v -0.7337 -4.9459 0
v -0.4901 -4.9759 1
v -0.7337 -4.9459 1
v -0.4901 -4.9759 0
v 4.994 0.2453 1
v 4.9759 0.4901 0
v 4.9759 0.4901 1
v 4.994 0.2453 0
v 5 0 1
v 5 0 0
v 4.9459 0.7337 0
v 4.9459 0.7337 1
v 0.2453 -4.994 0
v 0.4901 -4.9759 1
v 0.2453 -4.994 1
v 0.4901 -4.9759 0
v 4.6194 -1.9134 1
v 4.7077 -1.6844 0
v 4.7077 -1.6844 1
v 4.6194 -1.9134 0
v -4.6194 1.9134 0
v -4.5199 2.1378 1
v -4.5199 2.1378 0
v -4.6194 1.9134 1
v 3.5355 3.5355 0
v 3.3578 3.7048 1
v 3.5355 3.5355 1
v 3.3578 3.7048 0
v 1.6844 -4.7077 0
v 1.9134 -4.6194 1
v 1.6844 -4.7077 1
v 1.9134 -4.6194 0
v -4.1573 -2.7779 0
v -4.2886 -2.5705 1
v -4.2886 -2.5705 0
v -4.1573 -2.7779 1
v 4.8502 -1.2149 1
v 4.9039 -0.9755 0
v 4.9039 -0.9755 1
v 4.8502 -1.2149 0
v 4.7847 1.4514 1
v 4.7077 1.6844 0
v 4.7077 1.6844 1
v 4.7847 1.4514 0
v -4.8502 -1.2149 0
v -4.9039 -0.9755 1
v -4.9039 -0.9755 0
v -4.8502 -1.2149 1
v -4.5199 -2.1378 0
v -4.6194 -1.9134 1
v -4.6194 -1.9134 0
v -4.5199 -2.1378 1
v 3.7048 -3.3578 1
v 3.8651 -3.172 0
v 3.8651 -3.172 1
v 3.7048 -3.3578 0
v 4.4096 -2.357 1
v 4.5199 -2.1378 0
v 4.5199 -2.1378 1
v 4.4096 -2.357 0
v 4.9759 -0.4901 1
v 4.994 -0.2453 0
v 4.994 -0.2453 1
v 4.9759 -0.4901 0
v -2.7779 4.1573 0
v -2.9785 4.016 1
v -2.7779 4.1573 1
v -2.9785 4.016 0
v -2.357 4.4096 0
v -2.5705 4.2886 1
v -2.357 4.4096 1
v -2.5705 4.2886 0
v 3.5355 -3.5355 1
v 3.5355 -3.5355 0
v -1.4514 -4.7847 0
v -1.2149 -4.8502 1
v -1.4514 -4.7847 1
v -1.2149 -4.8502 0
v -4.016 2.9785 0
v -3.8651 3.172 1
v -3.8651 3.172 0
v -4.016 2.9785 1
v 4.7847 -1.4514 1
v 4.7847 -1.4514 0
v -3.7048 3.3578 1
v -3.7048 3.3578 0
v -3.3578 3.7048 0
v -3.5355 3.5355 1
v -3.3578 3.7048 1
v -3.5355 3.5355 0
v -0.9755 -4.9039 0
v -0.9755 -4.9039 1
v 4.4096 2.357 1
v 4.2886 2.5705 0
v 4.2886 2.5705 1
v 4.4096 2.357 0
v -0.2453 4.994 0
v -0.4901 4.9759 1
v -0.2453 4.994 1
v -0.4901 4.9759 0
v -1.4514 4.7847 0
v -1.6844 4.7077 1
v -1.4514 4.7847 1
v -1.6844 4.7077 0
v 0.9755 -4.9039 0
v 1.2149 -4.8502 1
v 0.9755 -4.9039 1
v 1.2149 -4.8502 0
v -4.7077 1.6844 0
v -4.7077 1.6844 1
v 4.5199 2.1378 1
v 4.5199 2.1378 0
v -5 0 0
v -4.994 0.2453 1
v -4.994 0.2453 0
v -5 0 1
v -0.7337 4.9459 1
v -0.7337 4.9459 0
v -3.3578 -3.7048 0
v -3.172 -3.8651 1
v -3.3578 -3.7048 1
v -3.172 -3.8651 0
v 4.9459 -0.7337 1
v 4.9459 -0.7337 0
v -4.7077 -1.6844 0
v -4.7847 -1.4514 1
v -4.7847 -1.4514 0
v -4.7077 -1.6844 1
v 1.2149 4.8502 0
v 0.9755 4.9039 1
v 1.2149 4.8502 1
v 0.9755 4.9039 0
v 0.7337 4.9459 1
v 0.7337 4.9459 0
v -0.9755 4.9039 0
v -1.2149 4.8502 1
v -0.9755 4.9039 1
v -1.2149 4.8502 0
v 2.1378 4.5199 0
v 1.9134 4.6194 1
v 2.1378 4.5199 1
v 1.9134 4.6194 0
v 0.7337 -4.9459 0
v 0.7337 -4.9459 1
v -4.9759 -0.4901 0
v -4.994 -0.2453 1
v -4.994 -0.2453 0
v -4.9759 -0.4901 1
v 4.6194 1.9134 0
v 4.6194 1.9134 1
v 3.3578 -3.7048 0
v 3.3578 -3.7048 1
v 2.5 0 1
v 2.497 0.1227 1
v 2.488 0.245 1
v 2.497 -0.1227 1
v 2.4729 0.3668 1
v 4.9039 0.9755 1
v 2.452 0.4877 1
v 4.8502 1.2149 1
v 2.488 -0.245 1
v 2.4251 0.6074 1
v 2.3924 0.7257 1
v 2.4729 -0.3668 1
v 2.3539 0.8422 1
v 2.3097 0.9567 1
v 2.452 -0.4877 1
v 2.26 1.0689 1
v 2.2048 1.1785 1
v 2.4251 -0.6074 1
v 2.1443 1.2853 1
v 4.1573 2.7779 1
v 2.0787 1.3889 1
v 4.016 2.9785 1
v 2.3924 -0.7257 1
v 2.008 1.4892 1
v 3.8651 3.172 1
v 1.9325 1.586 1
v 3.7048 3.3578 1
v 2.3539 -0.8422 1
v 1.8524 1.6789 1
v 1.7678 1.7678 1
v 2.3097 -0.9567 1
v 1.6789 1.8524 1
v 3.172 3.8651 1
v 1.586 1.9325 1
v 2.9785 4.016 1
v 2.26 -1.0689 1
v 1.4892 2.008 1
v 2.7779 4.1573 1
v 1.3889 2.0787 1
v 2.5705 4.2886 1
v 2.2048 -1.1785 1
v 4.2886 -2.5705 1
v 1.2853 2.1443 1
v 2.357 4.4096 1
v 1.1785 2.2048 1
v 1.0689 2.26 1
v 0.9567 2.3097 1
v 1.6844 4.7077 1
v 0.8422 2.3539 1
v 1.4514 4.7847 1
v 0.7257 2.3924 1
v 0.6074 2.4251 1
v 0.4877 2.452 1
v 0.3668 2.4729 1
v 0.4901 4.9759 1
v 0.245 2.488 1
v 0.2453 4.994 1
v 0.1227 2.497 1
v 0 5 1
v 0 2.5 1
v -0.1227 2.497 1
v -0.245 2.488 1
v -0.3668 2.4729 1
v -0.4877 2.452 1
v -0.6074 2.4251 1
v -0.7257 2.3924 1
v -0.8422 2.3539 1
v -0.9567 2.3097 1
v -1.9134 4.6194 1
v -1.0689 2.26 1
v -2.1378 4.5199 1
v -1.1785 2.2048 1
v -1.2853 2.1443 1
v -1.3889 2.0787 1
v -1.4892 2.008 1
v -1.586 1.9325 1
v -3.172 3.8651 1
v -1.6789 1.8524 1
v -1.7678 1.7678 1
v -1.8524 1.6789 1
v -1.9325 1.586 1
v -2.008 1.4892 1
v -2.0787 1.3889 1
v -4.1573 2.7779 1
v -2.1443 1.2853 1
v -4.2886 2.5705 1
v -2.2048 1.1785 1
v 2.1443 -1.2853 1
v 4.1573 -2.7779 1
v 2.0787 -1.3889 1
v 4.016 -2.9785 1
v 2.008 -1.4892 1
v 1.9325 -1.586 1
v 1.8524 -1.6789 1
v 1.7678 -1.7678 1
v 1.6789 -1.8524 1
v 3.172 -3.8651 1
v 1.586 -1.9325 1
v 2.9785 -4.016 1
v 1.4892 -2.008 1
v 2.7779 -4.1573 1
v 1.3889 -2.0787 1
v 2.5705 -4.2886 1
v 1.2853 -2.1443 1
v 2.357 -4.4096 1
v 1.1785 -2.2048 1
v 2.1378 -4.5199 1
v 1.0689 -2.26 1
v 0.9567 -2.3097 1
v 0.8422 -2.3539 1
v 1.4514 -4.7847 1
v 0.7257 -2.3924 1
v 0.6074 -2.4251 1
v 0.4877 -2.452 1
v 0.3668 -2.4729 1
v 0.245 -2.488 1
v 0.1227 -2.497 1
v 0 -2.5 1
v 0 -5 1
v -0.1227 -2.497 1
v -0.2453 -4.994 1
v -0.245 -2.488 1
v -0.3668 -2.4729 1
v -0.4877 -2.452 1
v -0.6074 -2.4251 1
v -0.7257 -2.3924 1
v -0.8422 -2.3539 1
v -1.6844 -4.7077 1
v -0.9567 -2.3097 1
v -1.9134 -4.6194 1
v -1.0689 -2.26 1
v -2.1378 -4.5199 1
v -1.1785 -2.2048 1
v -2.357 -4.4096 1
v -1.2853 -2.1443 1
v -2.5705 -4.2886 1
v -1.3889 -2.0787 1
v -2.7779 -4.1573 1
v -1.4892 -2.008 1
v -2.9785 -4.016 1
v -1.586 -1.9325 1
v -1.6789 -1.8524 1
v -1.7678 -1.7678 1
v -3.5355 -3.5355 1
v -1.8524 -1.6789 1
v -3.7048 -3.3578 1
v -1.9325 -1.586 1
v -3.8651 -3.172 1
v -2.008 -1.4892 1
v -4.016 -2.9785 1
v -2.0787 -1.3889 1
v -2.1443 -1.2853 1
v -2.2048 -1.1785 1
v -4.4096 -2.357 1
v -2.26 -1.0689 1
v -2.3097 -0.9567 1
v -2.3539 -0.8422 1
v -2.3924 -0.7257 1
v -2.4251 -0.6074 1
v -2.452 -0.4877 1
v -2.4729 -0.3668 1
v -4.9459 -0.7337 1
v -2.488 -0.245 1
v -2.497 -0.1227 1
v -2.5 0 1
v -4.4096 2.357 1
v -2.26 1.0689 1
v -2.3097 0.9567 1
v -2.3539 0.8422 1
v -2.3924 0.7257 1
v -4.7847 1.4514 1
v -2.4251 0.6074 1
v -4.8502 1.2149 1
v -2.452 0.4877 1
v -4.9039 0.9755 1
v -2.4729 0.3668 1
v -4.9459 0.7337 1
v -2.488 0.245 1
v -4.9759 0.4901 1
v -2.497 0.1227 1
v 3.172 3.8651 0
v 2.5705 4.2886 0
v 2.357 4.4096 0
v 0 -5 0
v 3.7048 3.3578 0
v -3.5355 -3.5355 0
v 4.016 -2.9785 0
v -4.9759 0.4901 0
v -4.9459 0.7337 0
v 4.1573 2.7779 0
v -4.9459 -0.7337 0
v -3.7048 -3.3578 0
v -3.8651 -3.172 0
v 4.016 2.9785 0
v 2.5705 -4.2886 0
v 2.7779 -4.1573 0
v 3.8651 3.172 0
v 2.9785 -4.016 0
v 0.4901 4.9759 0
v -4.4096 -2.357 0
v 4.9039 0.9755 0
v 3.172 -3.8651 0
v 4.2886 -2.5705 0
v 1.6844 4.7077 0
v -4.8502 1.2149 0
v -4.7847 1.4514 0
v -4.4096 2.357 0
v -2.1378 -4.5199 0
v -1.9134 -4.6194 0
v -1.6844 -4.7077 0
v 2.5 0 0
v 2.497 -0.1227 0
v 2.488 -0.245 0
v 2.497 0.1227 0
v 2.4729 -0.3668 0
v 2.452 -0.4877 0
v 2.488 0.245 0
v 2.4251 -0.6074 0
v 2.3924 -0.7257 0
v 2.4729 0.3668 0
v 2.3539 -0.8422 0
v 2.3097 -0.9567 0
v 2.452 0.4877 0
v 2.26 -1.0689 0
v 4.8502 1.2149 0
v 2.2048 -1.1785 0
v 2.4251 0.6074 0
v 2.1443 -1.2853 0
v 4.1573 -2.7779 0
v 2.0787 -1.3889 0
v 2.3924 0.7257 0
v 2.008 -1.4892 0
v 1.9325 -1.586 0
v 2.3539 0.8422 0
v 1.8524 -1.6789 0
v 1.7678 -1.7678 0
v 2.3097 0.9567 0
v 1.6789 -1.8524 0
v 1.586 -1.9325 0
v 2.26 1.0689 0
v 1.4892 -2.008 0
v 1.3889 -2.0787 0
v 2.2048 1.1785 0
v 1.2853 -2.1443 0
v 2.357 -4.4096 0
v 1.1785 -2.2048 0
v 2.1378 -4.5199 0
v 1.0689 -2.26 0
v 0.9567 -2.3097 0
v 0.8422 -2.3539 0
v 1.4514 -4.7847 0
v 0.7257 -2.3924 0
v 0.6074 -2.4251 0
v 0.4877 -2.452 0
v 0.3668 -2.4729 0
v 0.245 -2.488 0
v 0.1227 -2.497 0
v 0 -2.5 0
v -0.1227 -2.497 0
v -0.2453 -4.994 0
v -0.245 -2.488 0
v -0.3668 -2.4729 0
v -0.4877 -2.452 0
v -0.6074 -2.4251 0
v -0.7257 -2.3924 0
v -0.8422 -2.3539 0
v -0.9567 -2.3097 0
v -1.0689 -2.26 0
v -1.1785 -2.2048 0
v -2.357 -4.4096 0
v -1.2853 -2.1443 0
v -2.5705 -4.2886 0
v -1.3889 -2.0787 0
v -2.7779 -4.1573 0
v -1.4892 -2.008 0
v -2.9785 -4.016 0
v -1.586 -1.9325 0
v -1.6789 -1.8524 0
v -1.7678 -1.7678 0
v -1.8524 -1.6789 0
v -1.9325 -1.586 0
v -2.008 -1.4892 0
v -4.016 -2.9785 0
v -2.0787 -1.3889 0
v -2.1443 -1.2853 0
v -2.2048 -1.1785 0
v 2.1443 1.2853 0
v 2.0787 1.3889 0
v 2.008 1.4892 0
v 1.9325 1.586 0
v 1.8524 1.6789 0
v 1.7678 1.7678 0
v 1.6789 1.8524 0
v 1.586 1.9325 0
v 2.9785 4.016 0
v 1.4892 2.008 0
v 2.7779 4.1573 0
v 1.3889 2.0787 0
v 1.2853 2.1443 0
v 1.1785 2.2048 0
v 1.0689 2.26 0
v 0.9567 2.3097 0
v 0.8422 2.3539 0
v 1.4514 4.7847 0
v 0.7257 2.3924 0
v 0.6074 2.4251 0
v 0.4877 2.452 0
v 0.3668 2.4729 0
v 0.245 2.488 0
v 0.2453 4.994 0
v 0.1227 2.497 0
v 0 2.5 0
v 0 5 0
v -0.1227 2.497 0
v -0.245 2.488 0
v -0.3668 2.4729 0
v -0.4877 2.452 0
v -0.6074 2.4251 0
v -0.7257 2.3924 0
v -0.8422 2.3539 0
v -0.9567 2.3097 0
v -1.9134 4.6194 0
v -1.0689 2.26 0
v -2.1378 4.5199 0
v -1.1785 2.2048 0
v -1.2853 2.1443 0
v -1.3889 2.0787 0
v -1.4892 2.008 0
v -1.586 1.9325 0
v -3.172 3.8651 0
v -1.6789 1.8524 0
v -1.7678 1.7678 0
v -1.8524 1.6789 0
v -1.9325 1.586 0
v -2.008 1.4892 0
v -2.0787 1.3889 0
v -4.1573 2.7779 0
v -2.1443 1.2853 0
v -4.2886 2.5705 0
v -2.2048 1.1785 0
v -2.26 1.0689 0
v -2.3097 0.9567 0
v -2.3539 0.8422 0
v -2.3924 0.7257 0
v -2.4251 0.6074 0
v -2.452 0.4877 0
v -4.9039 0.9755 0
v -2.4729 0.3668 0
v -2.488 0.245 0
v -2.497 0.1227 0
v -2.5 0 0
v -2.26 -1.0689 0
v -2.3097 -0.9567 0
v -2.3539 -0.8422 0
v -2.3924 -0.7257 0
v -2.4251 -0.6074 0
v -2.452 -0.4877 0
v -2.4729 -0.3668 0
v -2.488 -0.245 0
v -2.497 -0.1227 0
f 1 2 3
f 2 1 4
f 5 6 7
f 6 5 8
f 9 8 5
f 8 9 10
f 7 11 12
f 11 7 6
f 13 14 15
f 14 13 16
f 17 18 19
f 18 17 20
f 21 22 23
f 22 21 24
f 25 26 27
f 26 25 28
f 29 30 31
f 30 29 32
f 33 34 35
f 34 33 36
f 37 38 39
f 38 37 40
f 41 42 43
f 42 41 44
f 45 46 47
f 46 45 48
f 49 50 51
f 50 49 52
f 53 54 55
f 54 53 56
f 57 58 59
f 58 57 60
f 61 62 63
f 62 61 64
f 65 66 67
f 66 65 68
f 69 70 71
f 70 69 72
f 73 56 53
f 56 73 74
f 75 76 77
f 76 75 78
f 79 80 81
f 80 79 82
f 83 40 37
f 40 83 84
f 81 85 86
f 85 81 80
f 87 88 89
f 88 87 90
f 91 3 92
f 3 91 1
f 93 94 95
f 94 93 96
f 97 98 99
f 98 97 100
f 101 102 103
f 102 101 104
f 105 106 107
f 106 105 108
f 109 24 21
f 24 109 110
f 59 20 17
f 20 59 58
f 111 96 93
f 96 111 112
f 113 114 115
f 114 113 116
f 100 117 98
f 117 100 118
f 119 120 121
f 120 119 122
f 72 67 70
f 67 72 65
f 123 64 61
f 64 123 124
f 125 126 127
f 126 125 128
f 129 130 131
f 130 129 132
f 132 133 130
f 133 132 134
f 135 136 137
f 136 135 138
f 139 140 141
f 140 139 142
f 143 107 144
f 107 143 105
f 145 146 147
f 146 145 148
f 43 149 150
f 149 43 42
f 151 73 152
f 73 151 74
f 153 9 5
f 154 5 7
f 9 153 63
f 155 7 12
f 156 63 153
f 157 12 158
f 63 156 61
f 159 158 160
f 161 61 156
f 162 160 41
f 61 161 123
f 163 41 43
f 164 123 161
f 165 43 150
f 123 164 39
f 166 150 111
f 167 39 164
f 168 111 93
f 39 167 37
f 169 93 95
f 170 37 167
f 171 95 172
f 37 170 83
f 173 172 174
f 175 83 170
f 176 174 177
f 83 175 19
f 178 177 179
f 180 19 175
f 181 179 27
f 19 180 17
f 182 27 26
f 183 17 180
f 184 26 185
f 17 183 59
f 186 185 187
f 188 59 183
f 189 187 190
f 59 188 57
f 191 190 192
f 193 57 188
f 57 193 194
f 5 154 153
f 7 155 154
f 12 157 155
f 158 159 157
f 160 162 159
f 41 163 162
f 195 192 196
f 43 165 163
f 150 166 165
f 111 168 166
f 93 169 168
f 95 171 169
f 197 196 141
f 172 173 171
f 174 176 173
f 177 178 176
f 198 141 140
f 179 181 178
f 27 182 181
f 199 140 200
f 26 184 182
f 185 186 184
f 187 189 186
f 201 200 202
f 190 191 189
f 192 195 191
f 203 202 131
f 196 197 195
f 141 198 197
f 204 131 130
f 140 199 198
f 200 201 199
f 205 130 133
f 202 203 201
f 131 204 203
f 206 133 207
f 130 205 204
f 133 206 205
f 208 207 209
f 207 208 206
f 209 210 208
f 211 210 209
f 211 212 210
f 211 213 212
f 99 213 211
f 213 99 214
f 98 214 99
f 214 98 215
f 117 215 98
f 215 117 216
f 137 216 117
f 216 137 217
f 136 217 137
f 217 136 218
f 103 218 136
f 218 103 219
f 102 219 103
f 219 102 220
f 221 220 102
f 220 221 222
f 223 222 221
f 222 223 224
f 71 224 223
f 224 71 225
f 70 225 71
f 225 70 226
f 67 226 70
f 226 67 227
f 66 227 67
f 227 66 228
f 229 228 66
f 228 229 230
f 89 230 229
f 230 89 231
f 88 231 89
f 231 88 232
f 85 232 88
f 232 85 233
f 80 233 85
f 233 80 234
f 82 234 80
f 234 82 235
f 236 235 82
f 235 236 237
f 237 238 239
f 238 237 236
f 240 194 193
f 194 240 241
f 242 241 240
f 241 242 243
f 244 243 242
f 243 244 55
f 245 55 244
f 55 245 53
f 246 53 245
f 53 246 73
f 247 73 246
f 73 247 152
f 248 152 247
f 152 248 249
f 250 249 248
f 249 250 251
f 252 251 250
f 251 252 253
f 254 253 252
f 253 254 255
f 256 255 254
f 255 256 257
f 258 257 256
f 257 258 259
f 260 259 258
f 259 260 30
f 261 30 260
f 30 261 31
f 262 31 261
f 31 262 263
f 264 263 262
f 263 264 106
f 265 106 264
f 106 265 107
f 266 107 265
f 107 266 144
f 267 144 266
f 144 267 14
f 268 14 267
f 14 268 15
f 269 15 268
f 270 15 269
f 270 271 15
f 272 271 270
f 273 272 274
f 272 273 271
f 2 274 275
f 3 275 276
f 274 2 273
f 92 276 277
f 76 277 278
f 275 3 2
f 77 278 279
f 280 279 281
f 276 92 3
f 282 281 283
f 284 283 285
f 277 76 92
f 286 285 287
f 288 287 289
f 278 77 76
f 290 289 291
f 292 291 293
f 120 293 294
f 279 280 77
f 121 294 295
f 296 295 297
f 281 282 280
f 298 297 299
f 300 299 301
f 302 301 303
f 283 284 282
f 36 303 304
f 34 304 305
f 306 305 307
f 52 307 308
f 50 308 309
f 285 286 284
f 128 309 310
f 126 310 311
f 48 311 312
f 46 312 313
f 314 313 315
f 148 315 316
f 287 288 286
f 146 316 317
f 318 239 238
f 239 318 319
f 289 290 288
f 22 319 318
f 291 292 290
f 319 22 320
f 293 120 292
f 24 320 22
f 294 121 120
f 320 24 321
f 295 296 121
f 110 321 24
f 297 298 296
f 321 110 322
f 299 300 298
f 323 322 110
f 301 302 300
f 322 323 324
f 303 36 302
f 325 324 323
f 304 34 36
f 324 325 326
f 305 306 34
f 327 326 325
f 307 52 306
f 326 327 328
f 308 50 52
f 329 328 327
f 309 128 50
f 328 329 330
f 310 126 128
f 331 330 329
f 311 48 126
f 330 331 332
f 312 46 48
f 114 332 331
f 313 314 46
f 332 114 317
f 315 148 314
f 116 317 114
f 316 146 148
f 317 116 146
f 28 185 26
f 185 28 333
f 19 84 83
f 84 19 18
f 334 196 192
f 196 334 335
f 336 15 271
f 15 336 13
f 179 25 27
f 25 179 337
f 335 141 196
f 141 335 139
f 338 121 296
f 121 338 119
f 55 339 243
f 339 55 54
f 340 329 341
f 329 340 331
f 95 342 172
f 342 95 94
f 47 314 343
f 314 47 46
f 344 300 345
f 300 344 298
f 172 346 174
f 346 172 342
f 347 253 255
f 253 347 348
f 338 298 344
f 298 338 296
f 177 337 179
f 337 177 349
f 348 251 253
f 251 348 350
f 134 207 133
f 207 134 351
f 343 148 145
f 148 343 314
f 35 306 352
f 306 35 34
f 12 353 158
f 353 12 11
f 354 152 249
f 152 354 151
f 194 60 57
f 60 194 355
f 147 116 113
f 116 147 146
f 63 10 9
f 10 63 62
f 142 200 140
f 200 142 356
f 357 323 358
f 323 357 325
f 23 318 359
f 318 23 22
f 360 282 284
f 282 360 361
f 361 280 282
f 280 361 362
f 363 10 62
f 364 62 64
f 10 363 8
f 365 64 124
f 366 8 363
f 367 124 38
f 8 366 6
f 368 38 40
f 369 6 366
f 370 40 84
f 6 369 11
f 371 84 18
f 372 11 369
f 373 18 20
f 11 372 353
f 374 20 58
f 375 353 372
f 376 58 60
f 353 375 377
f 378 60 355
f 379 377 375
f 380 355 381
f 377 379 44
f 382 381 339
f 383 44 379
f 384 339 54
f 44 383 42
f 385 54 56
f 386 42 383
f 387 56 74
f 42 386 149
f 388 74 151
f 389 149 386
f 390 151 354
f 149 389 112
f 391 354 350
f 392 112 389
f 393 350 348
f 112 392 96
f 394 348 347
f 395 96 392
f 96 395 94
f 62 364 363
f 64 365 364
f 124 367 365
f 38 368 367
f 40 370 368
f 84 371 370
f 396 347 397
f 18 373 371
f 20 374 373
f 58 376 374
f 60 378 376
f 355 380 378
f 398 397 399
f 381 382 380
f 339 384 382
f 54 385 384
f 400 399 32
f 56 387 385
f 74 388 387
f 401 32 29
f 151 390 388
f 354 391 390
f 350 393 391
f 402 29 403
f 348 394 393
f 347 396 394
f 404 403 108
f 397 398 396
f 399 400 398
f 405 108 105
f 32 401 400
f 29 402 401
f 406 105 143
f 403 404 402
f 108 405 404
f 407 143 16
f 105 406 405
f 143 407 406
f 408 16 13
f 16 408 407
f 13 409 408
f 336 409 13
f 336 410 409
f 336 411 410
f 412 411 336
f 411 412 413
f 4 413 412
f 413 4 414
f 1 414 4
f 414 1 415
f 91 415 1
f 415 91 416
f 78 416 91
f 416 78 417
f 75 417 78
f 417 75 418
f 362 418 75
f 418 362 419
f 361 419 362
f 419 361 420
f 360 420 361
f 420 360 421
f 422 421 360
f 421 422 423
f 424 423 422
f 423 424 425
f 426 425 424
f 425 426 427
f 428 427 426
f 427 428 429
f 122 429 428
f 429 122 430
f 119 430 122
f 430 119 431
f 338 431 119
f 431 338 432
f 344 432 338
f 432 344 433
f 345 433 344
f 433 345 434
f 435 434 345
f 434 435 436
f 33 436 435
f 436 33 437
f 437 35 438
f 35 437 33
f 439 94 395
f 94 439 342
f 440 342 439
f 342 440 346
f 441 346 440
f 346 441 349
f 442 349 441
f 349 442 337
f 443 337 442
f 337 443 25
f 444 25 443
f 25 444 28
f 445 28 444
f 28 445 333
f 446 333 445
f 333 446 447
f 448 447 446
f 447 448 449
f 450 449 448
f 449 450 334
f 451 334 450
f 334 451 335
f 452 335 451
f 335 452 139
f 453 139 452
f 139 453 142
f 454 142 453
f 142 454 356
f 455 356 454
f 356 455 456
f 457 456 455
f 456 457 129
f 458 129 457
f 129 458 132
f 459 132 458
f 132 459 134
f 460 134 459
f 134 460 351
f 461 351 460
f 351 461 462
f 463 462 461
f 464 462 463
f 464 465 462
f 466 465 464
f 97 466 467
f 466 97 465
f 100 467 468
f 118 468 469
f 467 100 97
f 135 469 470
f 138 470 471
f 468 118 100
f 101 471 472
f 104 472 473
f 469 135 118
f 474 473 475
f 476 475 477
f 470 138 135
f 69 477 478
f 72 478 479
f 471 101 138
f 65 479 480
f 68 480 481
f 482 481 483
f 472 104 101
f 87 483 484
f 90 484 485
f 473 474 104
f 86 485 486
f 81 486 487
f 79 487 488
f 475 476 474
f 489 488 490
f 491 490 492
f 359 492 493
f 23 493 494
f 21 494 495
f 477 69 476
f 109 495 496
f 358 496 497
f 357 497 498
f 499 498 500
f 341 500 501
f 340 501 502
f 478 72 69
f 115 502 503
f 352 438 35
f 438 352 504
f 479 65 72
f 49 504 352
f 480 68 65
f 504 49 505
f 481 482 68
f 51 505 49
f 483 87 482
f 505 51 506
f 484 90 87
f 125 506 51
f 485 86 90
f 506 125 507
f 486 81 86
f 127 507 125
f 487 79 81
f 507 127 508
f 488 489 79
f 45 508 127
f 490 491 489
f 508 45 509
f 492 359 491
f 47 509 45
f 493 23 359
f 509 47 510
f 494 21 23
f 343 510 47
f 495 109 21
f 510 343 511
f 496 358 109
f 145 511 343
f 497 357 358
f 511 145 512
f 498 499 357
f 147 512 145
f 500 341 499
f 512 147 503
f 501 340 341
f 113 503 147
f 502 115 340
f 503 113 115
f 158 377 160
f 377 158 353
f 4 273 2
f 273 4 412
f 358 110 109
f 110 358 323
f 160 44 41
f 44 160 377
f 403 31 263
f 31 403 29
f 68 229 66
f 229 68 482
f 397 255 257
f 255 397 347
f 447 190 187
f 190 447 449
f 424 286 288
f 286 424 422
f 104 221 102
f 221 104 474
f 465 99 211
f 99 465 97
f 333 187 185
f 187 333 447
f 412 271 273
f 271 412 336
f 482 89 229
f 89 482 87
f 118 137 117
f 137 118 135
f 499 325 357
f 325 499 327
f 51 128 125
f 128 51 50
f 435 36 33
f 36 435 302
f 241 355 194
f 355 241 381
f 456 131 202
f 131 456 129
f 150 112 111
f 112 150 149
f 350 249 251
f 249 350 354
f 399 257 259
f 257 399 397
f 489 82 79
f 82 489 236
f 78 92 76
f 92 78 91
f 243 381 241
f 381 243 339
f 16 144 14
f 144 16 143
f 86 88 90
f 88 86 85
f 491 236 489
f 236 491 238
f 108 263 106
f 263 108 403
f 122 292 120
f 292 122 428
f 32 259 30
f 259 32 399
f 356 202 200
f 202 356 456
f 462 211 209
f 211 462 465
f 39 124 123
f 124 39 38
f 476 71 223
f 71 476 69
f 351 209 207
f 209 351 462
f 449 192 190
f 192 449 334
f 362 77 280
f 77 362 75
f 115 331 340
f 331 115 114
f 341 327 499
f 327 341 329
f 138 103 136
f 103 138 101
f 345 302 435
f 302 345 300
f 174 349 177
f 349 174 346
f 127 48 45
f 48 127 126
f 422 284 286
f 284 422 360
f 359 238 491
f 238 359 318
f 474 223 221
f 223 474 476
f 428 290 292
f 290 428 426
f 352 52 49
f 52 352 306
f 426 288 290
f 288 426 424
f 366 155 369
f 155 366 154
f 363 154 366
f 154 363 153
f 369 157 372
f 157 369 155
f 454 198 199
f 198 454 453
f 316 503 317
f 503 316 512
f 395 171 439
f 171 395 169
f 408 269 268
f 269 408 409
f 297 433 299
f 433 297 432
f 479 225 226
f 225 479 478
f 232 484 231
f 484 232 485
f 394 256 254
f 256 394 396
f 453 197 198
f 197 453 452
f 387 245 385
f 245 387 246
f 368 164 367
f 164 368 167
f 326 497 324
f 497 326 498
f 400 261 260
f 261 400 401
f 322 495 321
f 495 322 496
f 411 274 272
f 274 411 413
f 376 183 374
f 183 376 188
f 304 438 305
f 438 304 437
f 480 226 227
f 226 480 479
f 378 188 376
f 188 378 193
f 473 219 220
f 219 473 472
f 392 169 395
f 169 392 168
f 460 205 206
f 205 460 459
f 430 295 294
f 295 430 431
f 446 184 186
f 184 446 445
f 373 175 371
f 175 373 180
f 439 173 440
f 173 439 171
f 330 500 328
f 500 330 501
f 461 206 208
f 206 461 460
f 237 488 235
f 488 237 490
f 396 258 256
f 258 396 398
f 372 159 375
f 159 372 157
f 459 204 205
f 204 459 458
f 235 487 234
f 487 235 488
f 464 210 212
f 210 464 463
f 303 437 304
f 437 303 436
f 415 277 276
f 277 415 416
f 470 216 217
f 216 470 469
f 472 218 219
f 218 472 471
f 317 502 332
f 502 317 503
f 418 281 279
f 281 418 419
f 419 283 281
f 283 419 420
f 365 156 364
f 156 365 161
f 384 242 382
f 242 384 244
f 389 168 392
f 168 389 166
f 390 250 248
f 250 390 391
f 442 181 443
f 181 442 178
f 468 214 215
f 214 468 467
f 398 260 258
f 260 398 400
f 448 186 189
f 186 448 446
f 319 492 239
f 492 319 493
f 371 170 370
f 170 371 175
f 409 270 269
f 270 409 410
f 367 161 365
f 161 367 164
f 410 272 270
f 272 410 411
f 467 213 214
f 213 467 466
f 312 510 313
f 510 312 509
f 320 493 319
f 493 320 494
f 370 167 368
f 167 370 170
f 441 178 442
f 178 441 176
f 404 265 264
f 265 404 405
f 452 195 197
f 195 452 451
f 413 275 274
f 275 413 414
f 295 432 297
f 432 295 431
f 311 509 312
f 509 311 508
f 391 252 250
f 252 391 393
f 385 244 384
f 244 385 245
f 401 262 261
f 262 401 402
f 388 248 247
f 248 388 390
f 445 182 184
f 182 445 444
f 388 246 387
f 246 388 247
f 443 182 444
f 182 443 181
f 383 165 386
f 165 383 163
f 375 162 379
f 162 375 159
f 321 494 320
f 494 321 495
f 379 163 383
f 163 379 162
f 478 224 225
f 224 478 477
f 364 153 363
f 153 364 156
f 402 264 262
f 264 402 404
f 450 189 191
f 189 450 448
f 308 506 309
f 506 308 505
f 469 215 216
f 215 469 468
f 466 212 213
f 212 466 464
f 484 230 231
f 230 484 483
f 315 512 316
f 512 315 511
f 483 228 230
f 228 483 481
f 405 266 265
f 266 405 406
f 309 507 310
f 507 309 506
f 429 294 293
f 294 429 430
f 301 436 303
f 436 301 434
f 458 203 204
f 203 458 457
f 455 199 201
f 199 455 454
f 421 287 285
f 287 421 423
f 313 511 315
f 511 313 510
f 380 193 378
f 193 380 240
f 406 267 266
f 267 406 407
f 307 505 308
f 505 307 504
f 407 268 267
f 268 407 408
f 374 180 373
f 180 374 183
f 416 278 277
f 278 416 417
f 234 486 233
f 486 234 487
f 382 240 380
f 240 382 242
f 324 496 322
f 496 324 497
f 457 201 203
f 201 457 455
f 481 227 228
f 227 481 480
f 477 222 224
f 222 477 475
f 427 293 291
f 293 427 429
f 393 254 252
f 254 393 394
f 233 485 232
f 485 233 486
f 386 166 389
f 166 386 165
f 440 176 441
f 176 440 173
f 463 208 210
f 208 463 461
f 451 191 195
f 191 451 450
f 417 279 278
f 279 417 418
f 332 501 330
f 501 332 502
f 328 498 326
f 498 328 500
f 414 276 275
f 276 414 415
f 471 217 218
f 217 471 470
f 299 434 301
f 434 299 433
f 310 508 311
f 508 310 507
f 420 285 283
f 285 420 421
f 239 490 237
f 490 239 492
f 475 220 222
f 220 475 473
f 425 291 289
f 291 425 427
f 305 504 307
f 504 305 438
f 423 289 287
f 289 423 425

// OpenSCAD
$fn = 128;

inner_d = 5.0;
outer_d = 10.0;
thickness = 1.0;

difference() {
  cylinder(d = outer_d, h = thickness);
  translate([0, 0, -0.1]) cylinder(d = inner_d, h = thickness + 0.2);
}
